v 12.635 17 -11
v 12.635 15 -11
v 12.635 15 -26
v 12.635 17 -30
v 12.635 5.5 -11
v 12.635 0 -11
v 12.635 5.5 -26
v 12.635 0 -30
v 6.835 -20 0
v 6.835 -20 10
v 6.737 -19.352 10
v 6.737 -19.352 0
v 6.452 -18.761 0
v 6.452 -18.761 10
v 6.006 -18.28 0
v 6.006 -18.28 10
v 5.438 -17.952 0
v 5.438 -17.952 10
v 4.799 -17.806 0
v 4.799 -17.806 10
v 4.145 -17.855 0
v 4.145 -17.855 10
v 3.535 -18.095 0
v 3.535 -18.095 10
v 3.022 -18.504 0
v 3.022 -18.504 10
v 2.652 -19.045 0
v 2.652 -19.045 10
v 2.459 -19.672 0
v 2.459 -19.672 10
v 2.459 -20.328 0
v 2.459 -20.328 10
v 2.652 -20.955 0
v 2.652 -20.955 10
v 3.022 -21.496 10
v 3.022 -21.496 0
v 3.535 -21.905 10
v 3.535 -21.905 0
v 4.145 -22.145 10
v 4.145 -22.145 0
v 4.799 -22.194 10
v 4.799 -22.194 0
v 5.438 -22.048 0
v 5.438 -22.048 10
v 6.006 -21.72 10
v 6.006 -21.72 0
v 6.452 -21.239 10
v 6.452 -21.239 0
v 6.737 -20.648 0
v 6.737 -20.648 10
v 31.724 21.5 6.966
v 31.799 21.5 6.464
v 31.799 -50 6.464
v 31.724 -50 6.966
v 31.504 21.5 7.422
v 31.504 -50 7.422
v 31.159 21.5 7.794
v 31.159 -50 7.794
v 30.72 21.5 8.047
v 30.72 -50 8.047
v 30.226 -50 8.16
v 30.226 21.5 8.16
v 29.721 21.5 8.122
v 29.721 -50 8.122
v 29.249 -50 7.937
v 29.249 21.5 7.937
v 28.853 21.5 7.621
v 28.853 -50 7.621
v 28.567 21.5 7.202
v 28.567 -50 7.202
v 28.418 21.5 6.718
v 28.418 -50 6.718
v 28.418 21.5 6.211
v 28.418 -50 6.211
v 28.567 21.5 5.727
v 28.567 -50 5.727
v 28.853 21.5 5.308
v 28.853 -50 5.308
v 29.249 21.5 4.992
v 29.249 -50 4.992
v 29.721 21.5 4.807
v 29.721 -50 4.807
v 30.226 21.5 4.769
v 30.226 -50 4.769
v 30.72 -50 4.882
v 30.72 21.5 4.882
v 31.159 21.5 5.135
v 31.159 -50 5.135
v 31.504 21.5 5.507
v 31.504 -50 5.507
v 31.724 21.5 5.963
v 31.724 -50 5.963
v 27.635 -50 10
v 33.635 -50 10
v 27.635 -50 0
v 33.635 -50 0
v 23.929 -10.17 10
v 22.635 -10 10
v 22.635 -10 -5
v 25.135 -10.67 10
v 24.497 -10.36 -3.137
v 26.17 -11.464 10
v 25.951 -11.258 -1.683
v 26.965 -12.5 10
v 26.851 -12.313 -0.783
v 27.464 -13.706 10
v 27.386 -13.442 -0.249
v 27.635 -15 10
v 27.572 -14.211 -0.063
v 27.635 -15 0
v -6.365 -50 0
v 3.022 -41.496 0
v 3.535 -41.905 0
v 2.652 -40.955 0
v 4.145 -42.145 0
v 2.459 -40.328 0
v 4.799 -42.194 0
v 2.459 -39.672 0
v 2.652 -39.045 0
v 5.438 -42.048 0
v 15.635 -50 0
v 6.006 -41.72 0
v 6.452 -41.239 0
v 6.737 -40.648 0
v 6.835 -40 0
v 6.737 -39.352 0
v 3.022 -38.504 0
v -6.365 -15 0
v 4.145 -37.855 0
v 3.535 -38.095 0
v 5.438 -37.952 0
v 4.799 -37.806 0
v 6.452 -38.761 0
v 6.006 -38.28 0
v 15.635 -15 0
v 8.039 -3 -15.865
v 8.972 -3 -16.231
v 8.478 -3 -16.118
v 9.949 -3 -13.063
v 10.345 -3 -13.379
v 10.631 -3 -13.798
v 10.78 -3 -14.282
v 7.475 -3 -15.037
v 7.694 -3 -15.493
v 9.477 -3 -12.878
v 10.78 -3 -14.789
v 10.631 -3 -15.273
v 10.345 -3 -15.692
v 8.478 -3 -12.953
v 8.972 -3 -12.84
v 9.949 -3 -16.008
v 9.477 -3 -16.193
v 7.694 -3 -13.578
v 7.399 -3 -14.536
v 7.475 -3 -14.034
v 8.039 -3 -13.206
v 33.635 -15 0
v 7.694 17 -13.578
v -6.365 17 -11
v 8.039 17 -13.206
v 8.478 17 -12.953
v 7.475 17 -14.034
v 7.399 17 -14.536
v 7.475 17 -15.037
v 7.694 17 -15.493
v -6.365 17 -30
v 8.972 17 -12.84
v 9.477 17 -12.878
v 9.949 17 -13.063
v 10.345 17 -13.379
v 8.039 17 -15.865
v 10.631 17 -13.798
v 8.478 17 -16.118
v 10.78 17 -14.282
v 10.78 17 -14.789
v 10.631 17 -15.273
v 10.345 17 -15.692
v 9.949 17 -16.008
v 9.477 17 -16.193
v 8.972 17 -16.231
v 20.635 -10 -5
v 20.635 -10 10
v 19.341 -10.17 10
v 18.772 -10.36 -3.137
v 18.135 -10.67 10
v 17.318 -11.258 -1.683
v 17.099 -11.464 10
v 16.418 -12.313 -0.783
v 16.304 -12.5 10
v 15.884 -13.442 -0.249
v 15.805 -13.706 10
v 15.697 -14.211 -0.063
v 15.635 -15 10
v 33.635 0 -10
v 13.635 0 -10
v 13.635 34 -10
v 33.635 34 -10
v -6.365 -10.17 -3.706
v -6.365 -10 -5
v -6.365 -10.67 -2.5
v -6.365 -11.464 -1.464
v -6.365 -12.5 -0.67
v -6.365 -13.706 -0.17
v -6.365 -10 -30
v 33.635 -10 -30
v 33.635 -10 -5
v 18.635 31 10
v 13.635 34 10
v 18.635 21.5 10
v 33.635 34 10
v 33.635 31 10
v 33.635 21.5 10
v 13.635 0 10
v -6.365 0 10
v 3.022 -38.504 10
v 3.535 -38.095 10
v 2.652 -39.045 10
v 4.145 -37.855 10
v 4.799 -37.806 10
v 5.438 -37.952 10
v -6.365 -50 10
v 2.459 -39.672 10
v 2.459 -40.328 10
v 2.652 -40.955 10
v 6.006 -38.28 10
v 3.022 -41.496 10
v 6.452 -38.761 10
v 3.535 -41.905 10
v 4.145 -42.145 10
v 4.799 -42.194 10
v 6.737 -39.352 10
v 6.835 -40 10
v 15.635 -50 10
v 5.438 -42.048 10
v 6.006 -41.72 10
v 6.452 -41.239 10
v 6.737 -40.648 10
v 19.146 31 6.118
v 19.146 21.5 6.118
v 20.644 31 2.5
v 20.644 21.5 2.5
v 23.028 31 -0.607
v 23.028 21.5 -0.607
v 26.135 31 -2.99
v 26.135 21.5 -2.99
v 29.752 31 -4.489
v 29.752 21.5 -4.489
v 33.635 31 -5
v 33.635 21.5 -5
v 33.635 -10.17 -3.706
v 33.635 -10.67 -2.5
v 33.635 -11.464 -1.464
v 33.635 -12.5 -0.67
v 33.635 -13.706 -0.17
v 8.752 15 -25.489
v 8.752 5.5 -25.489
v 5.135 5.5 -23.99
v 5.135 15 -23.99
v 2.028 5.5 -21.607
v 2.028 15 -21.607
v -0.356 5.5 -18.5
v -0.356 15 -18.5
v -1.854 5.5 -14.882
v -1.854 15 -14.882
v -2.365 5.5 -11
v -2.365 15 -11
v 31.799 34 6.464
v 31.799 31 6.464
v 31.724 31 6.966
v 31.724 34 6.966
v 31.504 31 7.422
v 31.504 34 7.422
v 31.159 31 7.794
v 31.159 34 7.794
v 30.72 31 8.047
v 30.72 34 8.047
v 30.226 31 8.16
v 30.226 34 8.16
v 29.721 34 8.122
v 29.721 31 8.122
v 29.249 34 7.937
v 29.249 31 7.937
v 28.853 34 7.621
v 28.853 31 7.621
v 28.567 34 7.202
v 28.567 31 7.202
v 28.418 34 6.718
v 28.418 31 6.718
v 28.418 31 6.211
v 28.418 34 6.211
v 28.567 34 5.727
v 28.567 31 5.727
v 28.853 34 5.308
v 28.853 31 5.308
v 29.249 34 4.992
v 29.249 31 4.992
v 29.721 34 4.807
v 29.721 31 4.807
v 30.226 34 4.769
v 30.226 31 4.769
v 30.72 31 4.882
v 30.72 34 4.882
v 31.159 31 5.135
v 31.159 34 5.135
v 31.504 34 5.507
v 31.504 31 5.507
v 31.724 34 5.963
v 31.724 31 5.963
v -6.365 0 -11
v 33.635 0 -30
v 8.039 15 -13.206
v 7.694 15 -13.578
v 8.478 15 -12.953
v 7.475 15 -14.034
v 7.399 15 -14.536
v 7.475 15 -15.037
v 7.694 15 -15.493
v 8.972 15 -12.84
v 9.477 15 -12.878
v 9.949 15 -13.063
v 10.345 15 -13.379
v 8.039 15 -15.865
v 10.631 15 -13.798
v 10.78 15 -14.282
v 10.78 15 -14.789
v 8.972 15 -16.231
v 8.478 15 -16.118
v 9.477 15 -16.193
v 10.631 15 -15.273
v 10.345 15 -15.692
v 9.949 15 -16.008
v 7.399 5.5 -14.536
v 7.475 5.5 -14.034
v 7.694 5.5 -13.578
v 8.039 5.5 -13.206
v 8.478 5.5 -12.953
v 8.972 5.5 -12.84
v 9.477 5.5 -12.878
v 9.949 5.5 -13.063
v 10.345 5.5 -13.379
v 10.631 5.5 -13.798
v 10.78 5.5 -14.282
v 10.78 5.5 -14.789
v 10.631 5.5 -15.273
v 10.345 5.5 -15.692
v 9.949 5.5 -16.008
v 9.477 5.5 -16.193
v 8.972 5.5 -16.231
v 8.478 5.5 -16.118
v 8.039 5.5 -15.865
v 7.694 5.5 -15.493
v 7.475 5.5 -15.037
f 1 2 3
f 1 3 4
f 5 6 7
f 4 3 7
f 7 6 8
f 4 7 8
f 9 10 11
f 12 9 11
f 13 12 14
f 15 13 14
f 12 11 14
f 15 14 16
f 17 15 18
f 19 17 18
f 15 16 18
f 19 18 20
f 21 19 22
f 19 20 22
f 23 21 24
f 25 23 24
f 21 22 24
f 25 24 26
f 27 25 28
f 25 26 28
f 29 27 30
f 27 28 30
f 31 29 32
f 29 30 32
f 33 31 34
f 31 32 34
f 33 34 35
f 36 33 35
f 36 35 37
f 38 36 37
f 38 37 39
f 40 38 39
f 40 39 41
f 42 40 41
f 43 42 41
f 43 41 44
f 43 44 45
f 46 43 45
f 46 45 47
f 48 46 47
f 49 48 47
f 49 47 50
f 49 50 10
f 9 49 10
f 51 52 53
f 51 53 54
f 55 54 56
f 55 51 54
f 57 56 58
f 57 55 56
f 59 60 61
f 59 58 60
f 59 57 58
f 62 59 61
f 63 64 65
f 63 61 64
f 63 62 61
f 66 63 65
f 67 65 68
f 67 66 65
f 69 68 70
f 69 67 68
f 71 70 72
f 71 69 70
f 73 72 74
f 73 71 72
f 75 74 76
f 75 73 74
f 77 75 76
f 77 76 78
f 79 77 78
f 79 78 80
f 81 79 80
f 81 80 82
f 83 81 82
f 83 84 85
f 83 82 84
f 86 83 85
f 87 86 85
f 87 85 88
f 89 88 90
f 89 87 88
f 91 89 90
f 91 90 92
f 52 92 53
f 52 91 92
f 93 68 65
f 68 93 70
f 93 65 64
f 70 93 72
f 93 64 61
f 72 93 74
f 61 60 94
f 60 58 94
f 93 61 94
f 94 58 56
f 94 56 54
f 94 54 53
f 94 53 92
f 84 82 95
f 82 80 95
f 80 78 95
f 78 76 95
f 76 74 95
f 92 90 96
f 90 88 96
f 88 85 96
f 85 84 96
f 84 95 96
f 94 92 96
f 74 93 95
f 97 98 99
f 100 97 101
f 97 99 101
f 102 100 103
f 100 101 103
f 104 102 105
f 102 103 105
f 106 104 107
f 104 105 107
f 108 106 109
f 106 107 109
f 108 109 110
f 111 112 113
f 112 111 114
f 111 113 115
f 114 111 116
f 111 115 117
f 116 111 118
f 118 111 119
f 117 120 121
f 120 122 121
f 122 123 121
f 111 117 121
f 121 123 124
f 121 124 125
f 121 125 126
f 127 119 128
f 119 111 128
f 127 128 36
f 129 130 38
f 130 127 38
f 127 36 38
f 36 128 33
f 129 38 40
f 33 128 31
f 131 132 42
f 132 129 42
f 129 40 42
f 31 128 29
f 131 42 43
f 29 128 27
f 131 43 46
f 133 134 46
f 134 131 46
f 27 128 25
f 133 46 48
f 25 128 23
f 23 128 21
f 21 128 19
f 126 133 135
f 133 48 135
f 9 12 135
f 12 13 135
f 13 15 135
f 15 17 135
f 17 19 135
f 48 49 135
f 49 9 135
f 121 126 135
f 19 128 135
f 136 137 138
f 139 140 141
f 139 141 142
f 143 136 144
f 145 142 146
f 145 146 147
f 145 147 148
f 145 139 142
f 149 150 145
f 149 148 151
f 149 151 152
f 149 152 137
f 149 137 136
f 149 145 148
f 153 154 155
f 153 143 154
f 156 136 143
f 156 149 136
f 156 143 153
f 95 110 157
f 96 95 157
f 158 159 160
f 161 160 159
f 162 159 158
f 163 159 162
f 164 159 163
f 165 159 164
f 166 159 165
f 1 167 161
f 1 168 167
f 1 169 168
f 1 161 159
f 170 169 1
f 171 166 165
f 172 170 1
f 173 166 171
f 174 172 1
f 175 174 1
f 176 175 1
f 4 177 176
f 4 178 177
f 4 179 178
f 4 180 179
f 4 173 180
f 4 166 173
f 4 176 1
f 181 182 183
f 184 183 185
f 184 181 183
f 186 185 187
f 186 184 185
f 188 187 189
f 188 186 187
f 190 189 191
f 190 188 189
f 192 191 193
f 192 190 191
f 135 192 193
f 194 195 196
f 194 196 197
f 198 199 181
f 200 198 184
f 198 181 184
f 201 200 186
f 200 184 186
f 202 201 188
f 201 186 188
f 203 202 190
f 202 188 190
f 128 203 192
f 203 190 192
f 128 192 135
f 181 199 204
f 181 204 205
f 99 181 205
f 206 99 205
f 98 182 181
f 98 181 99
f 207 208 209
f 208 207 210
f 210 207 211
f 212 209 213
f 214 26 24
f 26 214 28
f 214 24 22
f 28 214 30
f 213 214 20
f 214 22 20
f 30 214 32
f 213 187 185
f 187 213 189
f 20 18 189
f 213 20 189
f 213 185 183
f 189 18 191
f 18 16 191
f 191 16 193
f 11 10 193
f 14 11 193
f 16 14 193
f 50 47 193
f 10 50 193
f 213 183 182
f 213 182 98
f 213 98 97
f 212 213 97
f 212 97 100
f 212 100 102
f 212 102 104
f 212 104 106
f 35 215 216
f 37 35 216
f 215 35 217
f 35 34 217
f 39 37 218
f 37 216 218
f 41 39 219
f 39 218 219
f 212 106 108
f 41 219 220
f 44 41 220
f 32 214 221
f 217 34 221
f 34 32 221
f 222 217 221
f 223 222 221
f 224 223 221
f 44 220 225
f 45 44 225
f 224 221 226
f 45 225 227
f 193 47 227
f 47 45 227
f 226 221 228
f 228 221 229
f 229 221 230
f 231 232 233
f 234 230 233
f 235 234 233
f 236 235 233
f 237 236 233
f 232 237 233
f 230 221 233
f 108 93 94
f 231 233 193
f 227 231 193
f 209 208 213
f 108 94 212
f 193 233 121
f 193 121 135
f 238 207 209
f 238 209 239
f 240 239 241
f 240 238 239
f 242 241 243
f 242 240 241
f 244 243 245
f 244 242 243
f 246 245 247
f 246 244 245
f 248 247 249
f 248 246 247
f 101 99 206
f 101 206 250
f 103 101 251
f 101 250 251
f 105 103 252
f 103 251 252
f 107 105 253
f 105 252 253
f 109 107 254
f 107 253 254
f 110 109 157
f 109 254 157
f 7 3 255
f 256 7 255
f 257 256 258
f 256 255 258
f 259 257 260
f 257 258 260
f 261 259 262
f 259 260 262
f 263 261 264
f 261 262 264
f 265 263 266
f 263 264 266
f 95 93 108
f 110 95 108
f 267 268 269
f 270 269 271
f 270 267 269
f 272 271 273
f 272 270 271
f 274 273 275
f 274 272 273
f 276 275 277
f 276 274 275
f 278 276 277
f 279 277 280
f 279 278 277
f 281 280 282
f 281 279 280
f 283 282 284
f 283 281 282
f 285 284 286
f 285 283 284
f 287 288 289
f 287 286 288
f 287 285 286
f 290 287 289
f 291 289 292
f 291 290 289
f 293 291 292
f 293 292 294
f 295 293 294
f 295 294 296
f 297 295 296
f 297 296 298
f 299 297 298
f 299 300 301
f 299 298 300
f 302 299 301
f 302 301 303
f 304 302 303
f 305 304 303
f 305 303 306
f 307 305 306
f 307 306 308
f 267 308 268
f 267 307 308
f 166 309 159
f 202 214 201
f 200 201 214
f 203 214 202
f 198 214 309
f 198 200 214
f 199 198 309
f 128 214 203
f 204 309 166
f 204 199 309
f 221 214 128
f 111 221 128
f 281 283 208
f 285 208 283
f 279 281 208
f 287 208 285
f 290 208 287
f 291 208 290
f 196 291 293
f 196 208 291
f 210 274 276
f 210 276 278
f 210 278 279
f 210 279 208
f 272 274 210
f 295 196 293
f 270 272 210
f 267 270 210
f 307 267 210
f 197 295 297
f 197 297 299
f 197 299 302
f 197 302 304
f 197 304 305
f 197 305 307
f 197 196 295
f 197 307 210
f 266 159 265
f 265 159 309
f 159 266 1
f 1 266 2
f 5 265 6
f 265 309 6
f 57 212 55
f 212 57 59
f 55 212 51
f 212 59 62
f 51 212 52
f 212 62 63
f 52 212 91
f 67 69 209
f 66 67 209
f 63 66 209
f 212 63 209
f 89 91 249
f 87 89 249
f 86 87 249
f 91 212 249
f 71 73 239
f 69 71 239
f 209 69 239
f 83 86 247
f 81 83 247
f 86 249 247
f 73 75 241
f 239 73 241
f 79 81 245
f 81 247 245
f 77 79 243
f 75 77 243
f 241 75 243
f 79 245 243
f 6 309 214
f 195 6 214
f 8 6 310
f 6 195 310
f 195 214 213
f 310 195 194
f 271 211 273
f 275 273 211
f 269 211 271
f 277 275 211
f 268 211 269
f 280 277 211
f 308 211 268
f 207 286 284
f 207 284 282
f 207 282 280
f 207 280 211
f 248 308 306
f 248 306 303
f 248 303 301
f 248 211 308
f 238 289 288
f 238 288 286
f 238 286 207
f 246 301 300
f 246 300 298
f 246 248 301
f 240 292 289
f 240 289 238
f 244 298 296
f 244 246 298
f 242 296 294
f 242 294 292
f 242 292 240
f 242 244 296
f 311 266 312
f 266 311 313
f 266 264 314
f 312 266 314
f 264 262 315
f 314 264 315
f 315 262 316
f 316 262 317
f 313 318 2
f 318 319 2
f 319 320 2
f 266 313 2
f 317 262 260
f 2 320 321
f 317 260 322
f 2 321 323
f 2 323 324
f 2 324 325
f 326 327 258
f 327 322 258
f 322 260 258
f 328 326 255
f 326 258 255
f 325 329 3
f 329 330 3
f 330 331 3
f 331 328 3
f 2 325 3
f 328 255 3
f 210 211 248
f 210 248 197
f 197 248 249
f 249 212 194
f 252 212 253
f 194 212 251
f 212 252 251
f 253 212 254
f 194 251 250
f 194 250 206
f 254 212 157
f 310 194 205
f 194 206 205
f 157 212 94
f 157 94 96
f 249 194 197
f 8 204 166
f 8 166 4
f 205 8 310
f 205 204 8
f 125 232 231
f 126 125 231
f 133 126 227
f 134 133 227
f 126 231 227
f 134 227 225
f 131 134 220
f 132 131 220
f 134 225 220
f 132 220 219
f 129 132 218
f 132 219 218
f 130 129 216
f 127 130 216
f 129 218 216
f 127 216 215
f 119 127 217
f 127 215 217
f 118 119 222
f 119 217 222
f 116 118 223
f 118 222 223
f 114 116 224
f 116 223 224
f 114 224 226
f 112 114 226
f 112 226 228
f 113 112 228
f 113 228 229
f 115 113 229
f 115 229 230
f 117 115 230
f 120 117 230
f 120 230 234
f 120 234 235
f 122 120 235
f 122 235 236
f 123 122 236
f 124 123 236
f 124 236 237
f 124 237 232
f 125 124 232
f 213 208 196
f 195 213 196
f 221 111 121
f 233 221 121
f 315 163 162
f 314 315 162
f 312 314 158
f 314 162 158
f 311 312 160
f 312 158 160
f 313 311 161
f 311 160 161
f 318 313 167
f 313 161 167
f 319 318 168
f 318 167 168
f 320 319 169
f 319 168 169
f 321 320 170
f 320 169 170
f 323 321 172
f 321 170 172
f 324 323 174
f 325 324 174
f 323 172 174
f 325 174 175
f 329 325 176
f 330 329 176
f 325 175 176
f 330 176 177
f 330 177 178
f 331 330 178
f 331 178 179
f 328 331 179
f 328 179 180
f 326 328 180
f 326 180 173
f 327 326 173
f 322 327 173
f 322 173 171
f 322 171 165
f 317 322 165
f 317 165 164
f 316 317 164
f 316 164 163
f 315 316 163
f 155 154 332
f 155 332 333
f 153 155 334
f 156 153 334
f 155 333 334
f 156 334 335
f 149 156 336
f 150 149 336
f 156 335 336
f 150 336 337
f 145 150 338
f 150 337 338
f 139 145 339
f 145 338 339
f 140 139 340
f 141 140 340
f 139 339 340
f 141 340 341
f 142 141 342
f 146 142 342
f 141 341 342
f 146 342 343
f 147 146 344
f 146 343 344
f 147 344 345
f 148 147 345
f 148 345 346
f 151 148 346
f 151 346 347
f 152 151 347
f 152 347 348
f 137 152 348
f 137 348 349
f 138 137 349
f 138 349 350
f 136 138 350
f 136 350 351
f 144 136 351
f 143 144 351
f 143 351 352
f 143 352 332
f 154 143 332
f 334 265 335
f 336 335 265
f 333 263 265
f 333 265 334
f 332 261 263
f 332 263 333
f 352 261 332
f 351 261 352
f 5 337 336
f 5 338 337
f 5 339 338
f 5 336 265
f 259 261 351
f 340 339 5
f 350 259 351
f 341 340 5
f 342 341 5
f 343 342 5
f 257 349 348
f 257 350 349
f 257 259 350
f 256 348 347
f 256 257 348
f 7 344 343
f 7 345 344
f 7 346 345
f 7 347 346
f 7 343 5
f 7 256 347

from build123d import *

# Parameters (mm, degrees)
SKETCH1_W               = 40
SKETCH1_H               = 50
BOSS_EXTRUDE1_DEPTH     = 10
SKETCH2_W               = 40
SKETCH2_H               = 10
BOSS_EXTRUDE2_DEPTH     = 30
SKETCH3_W               = 20
SKETCH3_H               = 20
BOSS_EXTRUDE3_DEPTH     = 34
SKETCH4_W               = 19
SKETCH4_H               = 19
BOSS_EXTRUDE4_DEPTH     = 17
CUT_EXTRUDE4_DEPTH      = 9.5
CUT_EXTRUDE13_DEPTH     = 9.5
CUT_EXTRUDE7_DEPTH      = 93.694591653
CUT_EXTRUDE7_DEPTH_BACK = 3
SKETCH10_R              = 1.7
CUT_EXTRUDE9_REACH      = 74.328
SKETCH12_W              = 12
SKETCH12_H              = 40
FILLET2_R               = 5
CUT_EXTRUDE10_REACH     = 74.328
SKETCH13_R              = 2.2
SKETCH14_R              = 1.7
CUT_EXTRUDE14_DEPTH     = 20


with BuildPart() as part:
    # Sketch1 → Boss-Extrude1 (new body)
    with BuildSketch(Plane.XY):
        with Locations((13.634614932, -25)):
            Rectangle(SKETCH1_W, SKETCH1_H)
    extrude(amount=BOSS_EXTRUDE1_DEPTH)

    # Sketch2 → Boss-Extrude2 (add)
    with BuildSketch(Plane.XY):
        with Locations((13.634614932, -5)):
            Rectangle(SKETCH2_W, SKETCH2_H)
    extrude(amount=-BOSS_EXTRUDE2_DEPTH)

    # Sketch3 → Boss-Extrude3 (add)
    with BuildSketch(Plane(origin=(0, 0, 0), x_dir=(1, 0, 0), z_dir=(0, 1, 0))):
        with Locations((23.634614932, 0)):
            Rectangle(SKETCH3_W, SKETCH3_H)
    extrude(amount=BOSS_EXTRUDE3_DEPTH)

    # Sketch4 → Boss-Extrude4 (add)
    with BuildSketch(Plane(origin=(0, 0, 0), x_dir=(1, 0, 0), z_dir=(0, 1, 0))):
        with Locations((3.134614932, 20.5)):
            Rectangle(SKETCH4_W, SKETCH4_H)
    extrude(amount=BOSS_EXTRUDE4_DEPTH)

    # Sketch6 → Cut-Extrude4 (cut)
    with BuildSketch(Plane(origin=(0, 31, 0), x_dir=(1, 0, 0), z_dir=(0, 1, 0))):
        with BuildLine():
            Line((33.634614932, 5), (33.634614932, -10))
            Line((33.634614932, -10), (18.634614932, -10))
            ThreePointArc((18.634614932, -10), (23.028013215, 0.606601718), (33.634614932, 5))
        make_face()
    extrude(amount=-CUT_EXTRUDE4_DEPTH, mode=Mode.SUBTRACT)

    # Sketch7 → Cut-Extrude13 (cut)
    with BuildSketch(Plane(origin=(0, 15, 0), x_dir=(1, 0, 0), z_dir=(0, 1, 0))):
        with BuildLine():
            Line((-2.365385068, 11), (12.634614932, 11))
            Line((12.634614932, 11), (12.634614932, 26))
            ThreePointArc((12.634614932, 26), (2.028013215, 21.606601718), (-2.365385068, 11))
        make_face()
    extrude(amount=-CUT_EXTRUDE13_DEPTH, mode=Mode.SUBTRACT)

    # Sketch10 → Cut-Extrude7 (cut, two sides: drawn at the far end of the back side and taken through both)
    with BuildSketch(Plane(origin=(0, 31, 0), x_dir=(-1, 0, 0), z_dir=(0, -1, 0)).offset(-CUT_EXTRUDE7_DEPTH_BACK)):
        with Locations((-30.099081026, -6.464466094)):
            Circle(SKETCH10_R)
    extrude(amount=CUT_EXTRUDE7_DEPTH + CUT_EXTRUDE7_DEPTH_BACK, mode=Mode.SUBTRACT)

    # Sketch12 → Cut-Extrude9 (cut, up to next)
    with BuildSketch(Plane.XY.offset(10), mode=Mode.PRIVATE) as cut_extrude9_sk1:
        with Locations((21.634614932, -30)):
            Rectangle(SKETCH12_W, SKETCH12_H)
    cut_extrude9_tool1 = extrude(cut_extrude9_sk1.sketch, amount=-CUT_EXTRUDE9_REACH, mode=Mode.PRIVATE) & part.part
    add(cut_extrude9_tool1.solids().sort_by_distance((21.634615, -30, 10))[0], mode=Mode.SUBTRACT)

    # Fillet2
    fillet2_edges = [part.edges().sort_by_distance(p)[0] for p in [
        (15.634614932, -10, 5),
        (27.634614932, -10, 5),
        (4.634614932, -10, 0),
        (30.634614932, -10, 0),
    ]]
    fillet(fillet2_edges, radius=FILLET2_R)

    # Sketch13 → Cut-Extrude10 (cut, up to next)
    with BuildSketch(Plane.XY.offset(10), mode=Mode.PRIVATE) as cut_extrude10_sk1:
        with Locations((4.634614932, -20)):
            Circle(SKETCH13_R)
    cut_extrude10_tool1 = extrude(cut_extrude10_sk1.sketch, amount=-CUT_EXTRUDE10_REACH, mode=Mode.PRIVATE) & part.part
    # Sketch13 → Cut-Extrude10 (cut, up to next)
    with BuildSketch(Plane.XY.offset(10), mode=Mode.PRIVATE) as cut_extrude10_sk2:
        with Locations((4.634614932, -40)):
            Circle(SKETCH13_R)
    cut_extrude10_tool2 = extrude(cut_extrude10_sk2.sketch, amount=-CUT_EXTRUDE10_REACH, mode=Mode.PRIVATE) & part.part
    add(cut_extrude10_tool1.solids().sort_by_distance((4.634615, -20, 10))[0], mode=Mode.SUBTRACT)
    add(cut_extrude10_tool2.solids().sort_by_distance((4.634615, -40, 10))[0], mode=Mode.SUBTRACT)

    # Sketch14 → Cut-Extrude14 (cut)
    with BuildSketch(Plane(origin=(0, 17, 0), x_dir=(1, 0, 0), z_dir=(0, 1, 0))):
        with Locations((9.099081026, 14.535533906)):
            Circle(SKETCH14_R)
    extrude(amount=-CUT_EXTRUDE14_DEPTH, mode=Mode.SUBTRACT)


solid = part.part
